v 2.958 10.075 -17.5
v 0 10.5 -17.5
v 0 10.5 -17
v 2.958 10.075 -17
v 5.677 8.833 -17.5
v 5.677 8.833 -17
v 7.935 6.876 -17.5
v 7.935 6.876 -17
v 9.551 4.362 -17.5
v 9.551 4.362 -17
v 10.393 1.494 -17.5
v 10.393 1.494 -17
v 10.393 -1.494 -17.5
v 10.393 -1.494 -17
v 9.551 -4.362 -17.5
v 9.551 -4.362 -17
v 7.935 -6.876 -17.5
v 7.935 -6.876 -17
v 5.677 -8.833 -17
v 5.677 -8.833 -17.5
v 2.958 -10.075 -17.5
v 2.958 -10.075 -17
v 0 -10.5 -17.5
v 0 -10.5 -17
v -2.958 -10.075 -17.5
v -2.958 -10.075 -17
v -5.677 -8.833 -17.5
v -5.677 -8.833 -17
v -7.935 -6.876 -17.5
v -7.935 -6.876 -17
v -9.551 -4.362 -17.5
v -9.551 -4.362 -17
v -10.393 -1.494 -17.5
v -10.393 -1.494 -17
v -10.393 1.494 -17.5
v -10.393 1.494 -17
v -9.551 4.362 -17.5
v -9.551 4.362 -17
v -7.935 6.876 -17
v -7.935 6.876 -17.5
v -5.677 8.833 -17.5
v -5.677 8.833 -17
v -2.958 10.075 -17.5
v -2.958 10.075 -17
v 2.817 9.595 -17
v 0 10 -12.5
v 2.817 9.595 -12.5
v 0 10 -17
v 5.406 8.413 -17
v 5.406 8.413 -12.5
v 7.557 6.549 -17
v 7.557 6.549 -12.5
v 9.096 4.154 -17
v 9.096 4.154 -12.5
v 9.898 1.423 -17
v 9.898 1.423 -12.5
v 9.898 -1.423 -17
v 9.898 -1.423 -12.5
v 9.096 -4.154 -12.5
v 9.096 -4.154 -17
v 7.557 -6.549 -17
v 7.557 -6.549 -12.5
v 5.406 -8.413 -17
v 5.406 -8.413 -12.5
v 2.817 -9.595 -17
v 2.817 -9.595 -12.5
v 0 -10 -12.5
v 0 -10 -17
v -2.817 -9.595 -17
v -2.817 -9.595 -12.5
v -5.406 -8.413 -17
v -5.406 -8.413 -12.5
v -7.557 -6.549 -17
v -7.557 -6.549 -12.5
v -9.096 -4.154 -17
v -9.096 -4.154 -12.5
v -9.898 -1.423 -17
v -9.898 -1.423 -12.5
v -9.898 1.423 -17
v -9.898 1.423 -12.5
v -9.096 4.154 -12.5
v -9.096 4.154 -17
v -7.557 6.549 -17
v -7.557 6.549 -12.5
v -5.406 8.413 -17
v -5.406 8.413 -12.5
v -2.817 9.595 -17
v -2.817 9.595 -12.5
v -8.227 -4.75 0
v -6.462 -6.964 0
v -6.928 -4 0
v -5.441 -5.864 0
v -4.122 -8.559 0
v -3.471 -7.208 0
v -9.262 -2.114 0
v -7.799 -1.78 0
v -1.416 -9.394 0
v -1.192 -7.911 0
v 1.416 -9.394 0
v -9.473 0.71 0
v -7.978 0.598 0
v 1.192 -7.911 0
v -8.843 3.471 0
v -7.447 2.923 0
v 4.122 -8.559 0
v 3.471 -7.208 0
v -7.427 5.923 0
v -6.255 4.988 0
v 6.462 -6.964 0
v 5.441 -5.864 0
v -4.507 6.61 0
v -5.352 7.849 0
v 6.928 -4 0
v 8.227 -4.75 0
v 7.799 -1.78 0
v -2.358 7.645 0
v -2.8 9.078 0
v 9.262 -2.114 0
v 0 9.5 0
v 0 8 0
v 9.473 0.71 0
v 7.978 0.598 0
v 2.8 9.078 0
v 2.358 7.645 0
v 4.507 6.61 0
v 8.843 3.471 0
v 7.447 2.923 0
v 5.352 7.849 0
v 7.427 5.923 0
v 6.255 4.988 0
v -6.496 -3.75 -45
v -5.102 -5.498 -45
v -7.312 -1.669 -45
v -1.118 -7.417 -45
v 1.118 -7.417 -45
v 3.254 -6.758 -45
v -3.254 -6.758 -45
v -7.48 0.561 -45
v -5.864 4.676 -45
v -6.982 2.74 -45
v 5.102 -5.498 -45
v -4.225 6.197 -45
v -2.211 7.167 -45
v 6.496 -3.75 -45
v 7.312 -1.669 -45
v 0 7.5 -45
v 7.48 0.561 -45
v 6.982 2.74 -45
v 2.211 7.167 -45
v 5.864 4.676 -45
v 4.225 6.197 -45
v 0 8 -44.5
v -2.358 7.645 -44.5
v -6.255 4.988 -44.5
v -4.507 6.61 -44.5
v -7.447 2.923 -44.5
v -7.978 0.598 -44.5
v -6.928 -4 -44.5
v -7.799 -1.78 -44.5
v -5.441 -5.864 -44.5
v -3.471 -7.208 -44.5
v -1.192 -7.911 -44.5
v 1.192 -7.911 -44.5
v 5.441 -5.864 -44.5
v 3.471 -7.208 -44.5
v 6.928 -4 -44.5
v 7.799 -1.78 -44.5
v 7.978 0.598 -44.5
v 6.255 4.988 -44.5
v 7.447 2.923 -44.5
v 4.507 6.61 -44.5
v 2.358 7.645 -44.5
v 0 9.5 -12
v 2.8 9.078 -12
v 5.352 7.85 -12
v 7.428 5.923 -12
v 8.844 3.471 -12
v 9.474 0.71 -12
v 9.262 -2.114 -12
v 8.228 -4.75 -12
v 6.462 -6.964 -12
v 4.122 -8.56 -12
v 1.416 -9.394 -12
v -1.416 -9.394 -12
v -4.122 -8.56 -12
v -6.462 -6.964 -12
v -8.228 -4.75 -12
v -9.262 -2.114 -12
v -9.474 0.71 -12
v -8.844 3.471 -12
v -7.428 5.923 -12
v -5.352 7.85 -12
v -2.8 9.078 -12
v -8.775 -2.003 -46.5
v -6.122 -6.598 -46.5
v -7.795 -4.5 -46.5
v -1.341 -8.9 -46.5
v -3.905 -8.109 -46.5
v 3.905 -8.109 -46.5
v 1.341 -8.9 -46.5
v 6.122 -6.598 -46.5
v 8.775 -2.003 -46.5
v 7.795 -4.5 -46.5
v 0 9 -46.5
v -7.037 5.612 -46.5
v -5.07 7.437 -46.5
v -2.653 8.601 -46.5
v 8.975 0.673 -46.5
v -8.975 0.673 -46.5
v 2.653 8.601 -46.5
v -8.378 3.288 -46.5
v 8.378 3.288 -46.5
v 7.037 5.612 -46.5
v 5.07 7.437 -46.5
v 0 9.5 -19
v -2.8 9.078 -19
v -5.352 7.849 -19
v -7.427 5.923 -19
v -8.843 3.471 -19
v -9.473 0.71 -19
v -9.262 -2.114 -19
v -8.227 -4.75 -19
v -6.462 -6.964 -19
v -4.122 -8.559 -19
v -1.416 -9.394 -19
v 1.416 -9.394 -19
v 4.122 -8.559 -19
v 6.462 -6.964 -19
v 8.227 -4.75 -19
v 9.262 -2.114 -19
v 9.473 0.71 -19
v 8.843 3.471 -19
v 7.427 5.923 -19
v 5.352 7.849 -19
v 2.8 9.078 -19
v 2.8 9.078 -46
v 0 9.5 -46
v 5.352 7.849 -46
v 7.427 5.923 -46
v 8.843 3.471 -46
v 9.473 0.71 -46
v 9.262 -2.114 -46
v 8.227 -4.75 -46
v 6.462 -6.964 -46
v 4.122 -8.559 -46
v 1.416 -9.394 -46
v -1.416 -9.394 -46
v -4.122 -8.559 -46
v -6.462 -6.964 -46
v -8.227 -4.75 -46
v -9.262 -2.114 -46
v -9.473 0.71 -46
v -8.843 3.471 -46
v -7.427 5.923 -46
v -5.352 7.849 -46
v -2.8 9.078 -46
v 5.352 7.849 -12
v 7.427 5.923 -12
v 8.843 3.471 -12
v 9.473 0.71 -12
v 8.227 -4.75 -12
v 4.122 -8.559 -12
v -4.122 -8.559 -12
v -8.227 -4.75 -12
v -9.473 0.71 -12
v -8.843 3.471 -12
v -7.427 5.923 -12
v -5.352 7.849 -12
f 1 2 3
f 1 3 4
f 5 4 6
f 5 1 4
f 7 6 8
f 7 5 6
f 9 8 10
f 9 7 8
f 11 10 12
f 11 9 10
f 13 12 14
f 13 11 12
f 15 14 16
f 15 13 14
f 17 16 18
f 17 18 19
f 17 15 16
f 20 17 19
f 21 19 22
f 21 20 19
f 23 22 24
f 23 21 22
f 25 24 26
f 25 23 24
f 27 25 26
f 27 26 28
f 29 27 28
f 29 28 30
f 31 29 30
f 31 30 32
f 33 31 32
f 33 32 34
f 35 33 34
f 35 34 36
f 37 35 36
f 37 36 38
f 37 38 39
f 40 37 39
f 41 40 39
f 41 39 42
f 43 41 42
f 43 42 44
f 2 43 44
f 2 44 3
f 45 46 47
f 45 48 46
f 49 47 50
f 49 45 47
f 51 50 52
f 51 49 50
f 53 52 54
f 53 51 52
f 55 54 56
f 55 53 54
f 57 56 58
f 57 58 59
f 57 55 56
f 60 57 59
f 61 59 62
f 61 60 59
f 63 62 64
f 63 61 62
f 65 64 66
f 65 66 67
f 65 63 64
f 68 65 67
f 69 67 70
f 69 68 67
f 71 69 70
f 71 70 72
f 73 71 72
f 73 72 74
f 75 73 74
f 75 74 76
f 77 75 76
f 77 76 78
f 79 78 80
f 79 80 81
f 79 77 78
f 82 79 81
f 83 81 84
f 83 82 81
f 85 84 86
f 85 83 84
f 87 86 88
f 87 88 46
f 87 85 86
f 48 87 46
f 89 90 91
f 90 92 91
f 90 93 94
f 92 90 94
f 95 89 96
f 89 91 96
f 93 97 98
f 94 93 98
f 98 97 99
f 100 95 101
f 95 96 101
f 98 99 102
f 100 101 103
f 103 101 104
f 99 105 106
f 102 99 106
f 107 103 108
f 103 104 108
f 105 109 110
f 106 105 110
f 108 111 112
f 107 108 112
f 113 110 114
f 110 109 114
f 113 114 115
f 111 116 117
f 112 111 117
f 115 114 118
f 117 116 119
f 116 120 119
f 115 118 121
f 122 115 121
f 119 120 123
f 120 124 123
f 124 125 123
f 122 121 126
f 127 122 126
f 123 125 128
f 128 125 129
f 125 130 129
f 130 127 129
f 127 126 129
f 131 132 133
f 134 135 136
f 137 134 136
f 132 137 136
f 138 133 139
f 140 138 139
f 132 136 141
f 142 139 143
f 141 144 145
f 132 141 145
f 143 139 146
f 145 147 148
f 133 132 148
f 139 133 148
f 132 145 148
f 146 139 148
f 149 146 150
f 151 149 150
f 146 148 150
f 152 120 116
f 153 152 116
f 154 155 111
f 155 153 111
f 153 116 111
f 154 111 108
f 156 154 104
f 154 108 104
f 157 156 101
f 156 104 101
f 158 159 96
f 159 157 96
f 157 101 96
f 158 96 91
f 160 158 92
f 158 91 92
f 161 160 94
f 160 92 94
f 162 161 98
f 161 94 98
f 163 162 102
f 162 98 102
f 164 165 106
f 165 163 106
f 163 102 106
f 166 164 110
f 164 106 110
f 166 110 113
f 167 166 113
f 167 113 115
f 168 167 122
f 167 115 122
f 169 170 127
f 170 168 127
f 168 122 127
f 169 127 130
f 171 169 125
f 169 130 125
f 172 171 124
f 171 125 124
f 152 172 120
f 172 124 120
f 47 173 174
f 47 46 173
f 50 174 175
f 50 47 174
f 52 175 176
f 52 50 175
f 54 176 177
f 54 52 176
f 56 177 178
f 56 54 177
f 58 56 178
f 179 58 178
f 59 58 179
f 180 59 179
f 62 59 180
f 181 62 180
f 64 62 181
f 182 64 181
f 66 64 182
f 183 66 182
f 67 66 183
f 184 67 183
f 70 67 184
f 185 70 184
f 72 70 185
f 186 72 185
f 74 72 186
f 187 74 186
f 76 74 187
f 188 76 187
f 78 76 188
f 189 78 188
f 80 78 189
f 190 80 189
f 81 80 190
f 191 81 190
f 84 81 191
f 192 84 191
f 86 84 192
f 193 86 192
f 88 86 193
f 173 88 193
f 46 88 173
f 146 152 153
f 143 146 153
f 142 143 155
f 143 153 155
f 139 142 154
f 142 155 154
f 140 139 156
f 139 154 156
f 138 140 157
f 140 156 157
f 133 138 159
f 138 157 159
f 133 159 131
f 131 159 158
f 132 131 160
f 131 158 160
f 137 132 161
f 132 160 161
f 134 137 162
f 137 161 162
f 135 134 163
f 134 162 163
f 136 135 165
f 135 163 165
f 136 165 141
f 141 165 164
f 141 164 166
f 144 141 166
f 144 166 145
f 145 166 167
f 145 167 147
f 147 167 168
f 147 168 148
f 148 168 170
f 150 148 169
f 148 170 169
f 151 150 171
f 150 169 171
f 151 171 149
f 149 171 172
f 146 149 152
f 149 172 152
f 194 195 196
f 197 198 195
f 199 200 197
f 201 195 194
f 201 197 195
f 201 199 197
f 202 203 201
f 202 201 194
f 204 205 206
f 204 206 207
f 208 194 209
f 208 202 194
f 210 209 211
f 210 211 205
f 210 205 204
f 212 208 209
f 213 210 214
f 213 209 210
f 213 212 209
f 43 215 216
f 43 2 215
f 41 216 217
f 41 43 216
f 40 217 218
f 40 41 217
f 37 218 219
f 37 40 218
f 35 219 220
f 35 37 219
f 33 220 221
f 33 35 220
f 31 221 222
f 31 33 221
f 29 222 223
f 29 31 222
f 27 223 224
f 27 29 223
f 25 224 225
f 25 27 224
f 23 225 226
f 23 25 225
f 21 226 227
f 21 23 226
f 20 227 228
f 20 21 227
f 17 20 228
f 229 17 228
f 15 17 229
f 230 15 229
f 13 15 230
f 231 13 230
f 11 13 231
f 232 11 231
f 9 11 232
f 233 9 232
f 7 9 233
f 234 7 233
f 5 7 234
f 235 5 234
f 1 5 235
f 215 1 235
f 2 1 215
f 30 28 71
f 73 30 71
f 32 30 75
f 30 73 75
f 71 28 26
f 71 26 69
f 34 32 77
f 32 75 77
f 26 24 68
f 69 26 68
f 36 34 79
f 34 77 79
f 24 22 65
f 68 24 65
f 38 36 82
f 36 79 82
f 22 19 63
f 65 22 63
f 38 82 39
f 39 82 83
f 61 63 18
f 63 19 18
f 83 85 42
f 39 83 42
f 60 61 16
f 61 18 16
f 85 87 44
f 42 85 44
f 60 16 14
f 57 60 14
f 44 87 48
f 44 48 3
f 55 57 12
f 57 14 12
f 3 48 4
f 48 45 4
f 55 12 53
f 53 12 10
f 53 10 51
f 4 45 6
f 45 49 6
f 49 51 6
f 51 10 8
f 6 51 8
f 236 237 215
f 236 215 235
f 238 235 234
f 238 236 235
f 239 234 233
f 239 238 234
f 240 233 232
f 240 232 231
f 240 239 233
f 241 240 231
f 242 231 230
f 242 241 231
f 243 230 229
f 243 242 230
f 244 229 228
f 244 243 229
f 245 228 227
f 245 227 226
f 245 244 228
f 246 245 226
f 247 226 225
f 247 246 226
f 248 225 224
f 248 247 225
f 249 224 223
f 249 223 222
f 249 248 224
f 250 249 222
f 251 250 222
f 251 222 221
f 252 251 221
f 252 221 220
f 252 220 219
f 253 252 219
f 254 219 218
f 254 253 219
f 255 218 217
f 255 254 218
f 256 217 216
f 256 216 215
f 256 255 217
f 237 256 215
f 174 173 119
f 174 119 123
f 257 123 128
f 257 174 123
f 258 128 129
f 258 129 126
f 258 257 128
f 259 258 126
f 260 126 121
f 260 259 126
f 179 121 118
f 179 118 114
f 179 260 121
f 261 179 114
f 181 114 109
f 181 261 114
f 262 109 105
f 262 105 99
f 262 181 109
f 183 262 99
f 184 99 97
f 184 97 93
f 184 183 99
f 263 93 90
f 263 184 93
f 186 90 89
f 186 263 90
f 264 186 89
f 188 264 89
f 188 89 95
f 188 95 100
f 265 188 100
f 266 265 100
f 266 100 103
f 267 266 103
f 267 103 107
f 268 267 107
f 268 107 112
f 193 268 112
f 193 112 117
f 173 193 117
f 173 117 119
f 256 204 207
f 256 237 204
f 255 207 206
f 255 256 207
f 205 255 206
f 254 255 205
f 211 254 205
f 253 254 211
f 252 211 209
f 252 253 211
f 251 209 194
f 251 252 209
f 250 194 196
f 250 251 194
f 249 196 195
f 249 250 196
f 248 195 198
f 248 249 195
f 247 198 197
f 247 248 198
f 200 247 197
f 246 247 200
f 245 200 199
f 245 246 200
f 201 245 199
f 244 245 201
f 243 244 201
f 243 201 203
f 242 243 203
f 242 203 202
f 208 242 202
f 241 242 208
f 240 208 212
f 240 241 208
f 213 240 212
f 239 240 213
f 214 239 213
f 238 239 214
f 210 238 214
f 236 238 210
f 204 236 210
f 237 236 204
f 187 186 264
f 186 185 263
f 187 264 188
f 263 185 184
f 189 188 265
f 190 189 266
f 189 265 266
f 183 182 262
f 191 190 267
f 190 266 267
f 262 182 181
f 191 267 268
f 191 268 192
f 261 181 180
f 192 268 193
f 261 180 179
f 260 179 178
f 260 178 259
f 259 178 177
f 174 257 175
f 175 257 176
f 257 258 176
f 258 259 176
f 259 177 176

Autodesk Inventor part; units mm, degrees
ref_plane "YZ Plane" through (0, 0, 0) normal (1, 0, 0) x (0, 1, 0)
ref_plane "XZ Plane" through (0, 0, 0) normal (0, 1, 0) x (-1, 0, 0)
ref_plane "XY Plane" through (0, 0, 0) normal (0, 0, 1) x (1, 0, 0)
sketch "Esquisse3" plane through (0, 0, 0) normal (1, 0, 0) x (0, 1, 0)
  line L0 (0, 0) -> (0, -34.8052)
  line L1 (0, -45) -> (8, -45)
  line L2 (8, -45) -> (8, 0)
  line L3 (0, -45) -> (0, -46.5)
  line L4 (0, -46.5) -> (9.5, -46.5)
  line L5 (8, 0) -> (9.5, 0)
  line L6 (9.5, 0) -> (9.5, -12)
  line L7 (10, -12) -> (10, -17)
  line L8 (9.5, -19) -> (9.5, -46.5)
  line L9 (10, -17) -> (10.5, -17)
  line L10 (10.5, -17) -> (10.5, -17.5)
  line L11 (10.5, -17.5) -> (9.5, -19)
  line L12 (10, -12) -> (9.5, -12)
  dimension "d6" = 1.5
  dimension "d7" = 16
  dimension "d8" = 1.5
  dimension "d10" = 45
  dimension "d16" = 2
  dimension "d17" = 1.5
  dimension "d32" = 0.5
  dimension "d33" = 1.5
  dimension "d34" = 5
  dimension "d35" = 0.5
  dimension "d36" = 12
revolve "Révolution1" add sketch "Esquisse3" angle 360 about axis through (0, 0, 0) along (0, 0, -1)
thread "Filetage2" size "M20x1" class "6g" standard "ISO Metric profile" full length
chamfer "Chanfrein4" distance 0.5 angle 45 3 edges at (0, -10, -12) (0, -9.5, -46.5) (0, -8, -45)
thread "Filetage3" size "M16x1" class "6H" standard "ISO Metric profile" length 4
equation "\"d6\" = d5"
equation "\"d35\" = d32"
equation "\"d5\" = 1.5"
properties part number "cartridge_locker_piston_cyl"
